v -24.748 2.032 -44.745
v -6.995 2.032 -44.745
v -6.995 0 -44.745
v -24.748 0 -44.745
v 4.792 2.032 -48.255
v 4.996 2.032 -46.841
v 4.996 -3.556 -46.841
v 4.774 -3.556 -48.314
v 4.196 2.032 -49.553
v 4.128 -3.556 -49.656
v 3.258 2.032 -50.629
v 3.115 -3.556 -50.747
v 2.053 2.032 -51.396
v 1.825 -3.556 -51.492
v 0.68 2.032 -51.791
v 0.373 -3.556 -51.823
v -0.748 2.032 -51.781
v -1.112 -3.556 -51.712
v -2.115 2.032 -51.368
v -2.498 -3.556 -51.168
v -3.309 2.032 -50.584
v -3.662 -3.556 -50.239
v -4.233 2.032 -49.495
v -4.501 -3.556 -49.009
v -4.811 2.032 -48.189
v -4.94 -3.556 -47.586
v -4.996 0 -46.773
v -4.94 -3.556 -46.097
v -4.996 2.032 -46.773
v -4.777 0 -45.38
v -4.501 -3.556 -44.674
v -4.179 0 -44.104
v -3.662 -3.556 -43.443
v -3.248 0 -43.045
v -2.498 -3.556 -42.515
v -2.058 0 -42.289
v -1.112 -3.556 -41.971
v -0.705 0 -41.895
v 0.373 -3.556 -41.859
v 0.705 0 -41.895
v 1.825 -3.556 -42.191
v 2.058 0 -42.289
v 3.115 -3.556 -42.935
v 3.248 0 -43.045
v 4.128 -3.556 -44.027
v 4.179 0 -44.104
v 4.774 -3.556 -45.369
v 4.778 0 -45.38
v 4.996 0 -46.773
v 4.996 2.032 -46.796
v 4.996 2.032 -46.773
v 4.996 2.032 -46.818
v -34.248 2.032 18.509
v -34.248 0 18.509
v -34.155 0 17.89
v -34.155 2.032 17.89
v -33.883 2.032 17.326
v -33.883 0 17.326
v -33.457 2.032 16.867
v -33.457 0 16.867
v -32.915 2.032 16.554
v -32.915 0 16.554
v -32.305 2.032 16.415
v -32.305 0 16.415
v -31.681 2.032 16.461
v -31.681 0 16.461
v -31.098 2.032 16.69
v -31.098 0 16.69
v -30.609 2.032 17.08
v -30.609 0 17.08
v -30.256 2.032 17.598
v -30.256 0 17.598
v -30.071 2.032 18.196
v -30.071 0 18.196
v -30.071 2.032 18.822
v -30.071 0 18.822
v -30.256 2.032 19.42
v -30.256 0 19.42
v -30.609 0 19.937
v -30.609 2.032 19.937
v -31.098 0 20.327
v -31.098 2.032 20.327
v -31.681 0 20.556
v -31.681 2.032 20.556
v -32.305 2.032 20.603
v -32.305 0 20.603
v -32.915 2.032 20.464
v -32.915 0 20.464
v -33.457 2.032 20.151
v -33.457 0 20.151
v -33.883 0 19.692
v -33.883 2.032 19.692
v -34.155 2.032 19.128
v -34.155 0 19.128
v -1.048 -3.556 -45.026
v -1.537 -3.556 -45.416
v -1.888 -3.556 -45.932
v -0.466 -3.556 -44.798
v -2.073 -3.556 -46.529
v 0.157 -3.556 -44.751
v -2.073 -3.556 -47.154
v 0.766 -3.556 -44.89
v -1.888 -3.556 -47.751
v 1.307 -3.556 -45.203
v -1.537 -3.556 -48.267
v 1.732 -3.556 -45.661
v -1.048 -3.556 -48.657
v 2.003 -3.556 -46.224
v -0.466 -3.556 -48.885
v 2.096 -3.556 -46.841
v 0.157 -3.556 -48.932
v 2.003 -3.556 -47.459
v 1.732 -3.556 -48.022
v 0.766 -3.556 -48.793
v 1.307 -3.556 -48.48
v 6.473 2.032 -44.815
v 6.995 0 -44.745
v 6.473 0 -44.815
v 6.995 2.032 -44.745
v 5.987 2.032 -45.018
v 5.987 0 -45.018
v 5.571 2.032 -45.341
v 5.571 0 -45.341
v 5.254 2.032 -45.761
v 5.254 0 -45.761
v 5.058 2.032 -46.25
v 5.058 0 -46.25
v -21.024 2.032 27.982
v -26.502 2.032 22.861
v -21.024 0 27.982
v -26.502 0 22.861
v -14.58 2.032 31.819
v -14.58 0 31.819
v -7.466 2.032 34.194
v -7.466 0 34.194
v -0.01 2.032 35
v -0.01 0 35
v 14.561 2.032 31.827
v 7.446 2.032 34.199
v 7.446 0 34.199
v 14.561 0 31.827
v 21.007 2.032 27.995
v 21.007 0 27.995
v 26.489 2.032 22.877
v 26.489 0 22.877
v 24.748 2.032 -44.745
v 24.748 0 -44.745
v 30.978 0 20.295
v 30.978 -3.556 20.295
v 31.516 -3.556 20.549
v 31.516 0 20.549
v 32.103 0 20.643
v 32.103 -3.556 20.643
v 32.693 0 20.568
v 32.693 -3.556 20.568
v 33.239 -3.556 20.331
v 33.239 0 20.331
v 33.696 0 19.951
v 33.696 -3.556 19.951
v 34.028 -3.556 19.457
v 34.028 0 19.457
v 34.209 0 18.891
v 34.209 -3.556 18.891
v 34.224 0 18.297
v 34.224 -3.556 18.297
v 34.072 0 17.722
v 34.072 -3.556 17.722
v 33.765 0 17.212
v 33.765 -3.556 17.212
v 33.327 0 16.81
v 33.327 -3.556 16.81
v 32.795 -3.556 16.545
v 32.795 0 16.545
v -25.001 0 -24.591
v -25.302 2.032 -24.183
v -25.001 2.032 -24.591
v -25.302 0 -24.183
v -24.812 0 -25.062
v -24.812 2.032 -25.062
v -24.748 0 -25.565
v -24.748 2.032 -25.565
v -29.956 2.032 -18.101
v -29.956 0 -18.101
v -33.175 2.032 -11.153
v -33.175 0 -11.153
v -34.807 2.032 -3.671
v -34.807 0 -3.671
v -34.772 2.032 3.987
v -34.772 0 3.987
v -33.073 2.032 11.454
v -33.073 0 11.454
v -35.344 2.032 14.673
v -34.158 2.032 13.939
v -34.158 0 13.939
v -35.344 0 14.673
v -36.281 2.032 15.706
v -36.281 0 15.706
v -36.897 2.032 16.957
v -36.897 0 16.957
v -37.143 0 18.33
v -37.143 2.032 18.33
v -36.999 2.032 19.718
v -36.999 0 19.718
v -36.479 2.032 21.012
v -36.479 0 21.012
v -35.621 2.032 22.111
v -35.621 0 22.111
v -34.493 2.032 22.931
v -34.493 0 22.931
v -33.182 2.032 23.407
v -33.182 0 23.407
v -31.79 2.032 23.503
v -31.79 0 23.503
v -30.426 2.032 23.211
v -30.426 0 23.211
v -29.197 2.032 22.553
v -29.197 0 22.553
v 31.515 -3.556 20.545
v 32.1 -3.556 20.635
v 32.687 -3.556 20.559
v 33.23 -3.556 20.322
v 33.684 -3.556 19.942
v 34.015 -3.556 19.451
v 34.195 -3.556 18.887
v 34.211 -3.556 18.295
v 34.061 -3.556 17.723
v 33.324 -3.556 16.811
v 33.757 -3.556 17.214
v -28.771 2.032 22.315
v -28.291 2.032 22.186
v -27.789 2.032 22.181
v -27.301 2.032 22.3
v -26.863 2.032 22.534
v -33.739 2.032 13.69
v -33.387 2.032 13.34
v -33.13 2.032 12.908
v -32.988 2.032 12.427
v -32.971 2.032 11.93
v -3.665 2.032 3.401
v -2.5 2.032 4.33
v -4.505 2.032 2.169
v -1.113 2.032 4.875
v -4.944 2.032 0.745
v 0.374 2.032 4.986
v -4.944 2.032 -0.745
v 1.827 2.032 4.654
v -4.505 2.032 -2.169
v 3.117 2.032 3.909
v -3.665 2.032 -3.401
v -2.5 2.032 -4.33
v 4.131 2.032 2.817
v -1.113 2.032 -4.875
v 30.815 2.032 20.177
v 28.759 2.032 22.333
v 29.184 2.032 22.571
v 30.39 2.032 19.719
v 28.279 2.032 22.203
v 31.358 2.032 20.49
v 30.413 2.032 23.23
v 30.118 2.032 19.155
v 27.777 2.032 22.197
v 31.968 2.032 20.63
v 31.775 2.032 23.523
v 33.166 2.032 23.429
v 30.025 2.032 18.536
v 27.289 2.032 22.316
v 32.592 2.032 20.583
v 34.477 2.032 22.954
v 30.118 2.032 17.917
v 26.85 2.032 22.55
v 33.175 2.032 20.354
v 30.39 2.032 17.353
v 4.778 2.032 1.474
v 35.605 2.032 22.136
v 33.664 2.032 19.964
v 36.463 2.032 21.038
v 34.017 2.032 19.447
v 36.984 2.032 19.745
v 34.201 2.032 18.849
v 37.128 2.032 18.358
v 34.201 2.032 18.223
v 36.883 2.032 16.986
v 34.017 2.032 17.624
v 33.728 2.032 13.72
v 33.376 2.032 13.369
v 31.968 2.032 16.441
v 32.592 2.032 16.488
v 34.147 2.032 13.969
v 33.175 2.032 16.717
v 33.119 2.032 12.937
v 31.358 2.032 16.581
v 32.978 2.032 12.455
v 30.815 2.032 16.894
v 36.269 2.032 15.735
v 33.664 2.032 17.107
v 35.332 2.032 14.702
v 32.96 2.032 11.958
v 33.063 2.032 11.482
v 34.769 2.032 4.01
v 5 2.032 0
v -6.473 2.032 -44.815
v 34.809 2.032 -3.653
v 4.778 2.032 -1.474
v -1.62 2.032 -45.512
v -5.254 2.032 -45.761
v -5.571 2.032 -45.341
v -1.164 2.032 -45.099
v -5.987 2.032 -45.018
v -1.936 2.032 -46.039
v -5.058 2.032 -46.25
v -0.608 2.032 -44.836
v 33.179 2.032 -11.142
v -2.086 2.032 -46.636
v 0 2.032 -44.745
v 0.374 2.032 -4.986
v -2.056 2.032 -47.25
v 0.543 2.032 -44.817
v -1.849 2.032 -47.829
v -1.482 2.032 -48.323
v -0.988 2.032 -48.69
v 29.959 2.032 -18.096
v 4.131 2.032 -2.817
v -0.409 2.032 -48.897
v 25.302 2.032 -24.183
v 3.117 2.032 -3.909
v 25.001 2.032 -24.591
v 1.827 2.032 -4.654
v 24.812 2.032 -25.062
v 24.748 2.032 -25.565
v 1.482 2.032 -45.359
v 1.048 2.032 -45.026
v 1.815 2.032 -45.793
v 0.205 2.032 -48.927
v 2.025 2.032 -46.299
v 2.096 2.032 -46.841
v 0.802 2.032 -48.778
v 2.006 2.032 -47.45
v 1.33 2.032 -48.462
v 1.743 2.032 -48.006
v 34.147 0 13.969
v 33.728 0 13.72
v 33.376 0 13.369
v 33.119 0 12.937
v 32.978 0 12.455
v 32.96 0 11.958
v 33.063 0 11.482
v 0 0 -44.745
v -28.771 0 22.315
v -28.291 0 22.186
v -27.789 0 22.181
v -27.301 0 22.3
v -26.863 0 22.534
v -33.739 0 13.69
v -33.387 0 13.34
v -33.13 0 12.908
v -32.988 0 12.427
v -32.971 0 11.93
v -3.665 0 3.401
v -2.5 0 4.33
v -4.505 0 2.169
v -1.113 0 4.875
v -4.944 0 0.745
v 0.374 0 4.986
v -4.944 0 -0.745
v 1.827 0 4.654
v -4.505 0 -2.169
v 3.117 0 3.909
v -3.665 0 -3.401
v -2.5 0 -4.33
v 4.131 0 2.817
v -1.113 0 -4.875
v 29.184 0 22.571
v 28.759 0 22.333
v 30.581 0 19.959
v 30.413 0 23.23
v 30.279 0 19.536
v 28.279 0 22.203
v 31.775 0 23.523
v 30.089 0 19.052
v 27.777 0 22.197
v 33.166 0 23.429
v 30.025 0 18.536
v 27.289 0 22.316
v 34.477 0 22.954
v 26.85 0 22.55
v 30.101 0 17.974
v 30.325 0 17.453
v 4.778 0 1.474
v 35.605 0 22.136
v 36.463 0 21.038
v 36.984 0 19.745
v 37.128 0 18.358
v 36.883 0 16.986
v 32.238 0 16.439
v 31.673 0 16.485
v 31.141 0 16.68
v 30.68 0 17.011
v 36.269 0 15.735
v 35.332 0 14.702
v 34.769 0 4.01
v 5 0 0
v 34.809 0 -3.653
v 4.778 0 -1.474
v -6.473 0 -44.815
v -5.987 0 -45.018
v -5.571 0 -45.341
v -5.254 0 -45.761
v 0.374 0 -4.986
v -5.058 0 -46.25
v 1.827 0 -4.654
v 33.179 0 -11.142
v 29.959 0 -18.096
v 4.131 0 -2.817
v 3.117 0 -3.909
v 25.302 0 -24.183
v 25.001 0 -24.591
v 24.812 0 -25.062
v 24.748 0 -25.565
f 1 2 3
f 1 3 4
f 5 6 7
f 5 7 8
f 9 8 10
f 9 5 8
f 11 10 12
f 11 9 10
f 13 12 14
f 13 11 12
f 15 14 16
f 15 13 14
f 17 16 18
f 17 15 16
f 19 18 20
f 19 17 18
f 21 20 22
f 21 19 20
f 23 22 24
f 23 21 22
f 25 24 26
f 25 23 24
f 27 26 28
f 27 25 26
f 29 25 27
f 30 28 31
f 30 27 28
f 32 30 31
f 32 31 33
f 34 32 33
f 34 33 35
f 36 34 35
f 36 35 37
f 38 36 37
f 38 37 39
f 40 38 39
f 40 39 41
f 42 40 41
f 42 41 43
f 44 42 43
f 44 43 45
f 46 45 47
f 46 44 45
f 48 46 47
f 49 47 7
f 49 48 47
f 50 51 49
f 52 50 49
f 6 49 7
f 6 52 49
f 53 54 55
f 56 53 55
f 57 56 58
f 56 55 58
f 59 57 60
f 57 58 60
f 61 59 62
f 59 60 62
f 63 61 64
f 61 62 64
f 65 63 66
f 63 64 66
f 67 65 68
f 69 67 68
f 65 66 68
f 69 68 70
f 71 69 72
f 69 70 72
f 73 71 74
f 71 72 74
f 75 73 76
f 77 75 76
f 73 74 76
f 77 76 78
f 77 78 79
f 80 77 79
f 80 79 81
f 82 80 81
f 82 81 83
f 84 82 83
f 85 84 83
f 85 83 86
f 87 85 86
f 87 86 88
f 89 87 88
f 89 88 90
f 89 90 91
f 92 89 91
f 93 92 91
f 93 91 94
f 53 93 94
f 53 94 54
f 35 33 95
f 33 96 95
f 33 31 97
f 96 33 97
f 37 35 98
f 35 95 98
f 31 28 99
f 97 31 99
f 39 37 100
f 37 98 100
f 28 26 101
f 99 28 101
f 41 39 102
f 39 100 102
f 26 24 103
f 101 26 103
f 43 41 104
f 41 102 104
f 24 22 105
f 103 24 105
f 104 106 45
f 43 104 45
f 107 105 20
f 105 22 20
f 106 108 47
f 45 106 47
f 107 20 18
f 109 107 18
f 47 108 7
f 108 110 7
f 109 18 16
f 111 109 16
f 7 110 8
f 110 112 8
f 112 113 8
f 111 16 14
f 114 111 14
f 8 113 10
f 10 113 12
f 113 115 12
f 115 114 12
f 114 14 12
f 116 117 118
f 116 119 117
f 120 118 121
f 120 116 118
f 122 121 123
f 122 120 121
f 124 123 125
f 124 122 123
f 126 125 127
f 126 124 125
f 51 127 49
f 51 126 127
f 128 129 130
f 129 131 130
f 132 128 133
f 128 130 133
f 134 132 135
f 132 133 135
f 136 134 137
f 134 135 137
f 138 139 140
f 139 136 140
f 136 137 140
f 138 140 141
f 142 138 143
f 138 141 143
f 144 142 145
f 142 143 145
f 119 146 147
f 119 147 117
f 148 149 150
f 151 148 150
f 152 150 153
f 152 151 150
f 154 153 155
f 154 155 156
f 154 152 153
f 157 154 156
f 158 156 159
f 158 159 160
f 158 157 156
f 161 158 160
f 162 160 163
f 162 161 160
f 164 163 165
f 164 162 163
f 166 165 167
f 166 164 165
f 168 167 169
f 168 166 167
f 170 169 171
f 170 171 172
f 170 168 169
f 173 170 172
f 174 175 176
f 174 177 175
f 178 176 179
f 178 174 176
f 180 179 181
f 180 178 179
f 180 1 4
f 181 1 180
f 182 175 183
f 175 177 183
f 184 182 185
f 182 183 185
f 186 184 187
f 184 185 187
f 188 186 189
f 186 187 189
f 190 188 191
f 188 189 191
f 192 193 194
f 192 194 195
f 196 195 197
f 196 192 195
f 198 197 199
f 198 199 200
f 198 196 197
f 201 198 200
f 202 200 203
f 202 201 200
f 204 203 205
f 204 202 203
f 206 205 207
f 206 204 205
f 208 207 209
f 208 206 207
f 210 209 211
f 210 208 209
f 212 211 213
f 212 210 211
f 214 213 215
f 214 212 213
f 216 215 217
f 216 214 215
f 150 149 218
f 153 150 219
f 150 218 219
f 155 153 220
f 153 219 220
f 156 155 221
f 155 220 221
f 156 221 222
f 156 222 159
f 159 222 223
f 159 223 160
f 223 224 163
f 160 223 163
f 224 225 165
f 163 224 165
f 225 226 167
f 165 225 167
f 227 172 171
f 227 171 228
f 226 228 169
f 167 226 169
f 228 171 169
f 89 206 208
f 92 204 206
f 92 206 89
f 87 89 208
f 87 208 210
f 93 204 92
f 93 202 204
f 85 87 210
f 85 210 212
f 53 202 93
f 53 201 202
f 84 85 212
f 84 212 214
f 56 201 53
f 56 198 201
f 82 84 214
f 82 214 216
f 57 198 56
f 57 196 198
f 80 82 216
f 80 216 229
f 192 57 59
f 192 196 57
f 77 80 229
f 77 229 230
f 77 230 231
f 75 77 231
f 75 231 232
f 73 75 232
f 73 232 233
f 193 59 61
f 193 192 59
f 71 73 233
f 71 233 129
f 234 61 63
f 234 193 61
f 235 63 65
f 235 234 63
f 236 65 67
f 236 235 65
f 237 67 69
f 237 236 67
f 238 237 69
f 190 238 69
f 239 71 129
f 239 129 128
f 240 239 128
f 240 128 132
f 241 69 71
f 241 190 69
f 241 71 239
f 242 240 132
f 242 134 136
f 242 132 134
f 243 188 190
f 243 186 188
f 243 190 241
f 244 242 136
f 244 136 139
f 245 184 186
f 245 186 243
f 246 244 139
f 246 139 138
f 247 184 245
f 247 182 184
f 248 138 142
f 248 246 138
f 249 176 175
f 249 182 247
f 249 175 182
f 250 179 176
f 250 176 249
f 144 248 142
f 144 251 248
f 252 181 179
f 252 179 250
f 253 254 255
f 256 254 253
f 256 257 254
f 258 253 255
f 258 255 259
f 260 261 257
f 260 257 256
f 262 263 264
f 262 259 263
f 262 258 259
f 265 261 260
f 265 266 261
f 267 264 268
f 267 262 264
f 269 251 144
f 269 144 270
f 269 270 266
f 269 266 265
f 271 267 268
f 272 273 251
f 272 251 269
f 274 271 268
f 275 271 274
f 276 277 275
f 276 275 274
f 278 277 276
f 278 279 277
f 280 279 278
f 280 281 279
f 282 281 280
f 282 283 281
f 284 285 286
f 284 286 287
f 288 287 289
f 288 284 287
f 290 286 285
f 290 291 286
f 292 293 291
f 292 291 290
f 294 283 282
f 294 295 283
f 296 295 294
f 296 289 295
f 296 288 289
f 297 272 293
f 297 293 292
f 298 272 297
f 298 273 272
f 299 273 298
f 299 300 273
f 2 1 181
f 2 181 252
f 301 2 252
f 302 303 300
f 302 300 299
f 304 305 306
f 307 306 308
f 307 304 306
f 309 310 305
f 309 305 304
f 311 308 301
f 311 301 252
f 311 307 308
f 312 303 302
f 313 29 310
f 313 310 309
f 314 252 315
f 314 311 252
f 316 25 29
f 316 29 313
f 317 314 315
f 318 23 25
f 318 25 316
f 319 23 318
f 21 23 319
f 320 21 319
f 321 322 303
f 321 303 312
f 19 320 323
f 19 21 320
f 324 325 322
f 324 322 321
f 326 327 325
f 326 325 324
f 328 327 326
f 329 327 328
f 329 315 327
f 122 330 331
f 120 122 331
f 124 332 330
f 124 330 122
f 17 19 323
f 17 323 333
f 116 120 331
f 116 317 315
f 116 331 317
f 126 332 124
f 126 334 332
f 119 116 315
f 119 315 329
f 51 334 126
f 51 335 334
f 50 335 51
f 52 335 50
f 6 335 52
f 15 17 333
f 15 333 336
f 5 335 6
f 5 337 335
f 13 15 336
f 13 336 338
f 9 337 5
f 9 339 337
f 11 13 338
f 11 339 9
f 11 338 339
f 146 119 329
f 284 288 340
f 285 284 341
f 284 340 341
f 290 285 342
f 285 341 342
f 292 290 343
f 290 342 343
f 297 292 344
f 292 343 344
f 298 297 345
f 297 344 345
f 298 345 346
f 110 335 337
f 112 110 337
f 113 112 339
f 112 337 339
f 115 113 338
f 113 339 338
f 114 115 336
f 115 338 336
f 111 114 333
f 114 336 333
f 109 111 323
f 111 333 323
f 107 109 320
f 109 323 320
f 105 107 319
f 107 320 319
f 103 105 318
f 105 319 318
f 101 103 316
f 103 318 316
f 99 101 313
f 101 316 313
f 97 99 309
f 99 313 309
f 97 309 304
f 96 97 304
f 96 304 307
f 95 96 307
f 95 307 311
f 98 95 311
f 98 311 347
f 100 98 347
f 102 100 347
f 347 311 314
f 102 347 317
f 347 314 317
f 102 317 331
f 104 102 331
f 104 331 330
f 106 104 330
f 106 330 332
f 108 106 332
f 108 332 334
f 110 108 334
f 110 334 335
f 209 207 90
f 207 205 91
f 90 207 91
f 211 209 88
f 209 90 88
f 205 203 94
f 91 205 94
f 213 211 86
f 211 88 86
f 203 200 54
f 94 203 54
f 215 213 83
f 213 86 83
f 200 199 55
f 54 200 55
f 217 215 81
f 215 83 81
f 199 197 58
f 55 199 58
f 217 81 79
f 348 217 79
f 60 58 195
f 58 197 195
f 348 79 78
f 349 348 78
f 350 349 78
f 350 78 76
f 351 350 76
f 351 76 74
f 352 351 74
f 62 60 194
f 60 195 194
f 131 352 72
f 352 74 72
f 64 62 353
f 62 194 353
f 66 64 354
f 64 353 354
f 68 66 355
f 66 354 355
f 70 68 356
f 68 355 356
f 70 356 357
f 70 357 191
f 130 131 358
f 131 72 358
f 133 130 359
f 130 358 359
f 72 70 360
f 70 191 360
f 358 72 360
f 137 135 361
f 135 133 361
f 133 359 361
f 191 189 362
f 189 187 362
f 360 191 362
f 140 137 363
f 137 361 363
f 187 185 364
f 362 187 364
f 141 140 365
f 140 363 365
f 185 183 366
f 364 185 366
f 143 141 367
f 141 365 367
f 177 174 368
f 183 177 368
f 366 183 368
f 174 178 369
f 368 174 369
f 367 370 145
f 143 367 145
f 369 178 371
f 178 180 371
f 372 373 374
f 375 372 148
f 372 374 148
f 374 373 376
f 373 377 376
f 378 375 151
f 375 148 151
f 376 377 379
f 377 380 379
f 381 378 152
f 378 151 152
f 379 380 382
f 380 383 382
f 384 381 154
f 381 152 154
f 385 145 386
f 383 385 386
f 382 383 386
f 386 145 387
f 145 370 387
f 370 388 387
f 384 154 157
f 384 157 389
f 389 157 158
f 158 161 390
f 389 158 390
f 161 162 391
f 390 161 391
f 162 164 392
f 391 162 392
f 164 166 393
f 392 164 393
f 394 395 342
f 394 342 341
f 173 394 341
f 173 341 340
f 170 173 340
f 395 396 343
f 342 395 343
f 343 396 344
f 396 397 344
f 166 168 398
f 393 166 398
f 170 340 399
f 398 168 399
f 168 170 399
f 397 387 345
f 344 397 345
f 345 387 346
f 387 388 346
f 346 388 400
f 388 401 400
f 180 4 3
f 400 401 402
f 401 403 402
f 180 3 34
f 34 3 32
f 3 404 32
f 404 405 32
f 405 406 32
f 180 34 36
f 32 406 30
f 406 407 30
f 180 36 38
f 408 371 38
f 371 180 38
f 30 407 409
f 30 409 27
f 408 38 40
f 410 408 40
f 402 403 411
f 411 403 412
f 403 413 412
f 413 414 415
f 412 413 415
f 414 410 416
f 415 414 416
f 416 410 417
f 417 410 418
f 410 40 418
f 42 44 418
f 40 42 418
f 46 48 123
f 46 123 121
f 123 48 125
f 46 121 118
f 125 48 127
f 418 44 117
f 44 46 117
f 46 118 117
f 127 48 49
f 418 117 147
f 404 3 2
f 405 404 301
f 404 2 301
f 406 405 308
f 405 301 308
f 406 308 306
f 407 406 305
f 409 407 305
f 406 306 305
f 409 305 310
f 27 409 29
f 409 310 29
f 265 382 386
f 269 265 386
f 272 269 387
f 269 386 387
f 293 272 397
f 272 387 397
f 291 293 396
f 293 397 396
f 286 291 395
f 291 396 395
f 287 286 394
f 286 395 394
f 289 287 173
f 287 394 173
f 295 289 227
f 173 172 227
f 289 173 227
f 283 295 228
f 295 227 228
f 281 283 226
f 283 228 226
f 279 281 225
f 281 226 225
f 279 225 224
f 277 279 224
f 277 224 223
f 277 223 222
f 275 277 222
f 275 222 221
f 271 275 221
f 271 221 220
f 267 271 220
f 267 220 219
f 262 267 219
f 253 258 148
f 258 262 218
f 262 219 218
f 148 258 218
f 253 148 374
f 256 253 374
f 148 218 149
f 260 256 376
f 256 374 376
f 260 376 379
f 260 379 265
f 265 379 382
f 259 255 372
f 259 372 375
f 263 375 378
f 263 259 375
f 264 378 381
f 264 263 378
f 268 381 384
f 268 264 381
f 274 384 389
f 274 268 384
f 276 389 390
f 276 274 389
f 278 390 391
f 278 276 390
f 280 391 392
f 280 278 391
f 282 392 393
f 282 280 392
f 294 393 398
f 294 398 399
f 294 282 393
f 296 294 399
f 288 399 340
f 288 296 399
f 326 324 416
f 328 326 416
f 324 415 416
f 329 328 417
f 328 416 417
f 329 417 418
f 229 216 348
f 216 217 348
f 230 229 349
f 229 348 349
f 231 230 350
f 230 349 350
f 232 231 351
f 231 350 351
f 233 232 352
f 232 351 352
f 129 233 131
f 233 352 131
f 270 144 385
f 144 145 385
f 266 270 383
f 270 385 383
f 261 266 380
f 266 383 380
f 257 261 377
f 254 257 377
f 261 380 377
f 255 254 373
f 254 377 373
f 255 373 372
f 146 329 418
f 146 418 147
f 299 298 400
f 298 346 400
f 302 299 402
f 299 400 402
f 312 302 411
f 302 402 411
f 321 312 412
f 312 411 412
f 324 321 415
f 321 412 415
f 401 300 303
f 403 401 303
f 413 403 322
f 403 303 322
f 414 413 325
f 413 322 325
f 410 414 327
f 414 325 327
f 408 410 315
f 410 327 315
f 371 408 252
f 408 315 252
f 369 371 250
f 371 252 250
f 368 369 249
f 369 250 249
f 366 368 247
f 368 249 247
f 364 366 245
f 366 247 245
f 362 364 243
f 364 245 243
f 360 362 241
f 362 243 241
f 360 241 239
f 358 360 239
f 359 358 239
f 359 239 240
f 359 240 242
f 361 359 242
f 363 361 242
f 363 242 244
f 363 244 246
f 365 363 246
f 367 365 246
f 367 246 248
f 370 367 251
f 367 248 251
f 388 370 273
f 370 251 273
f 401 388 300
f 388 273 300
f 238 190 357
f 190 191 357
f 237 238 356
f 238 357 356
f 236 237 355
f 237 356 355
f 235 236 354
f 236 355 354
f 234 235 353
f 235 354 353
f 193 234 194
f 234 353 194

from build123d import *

# Parameters (mm, degrees)
SKETCH13_R                 = 35
BOSS_EXTRUDE3_DEPTH        = 2.032
BOSS_EXTRUDE4_DEPTH        = 2.032
SKETCH15_R                 = 4.995989681
SKETCH15_R_2               = 2.096052025
BOSS_EXTRUDE11_DEPTH       = 5.588
SKETCH14_6_R               = 4.995125596
BOSS_EXTRUDE12_DEPTH       = 2.032
SKETCH14_8_R               = 2.101679538
BOSS_EXTRUDE14_DEPTH       = 5.588
F_4_2_4_2_DIAMETER_HOLE1_D = 4.2
SKETCH14_11_R              = 4.999542267
BOSS_EXTRUDE15_DEPTH       = 2.032
F_4_2_4_2_DIAMETER_HOLE2_D = 4.2
FILLET4_R                  = 2
FILLET6_R                  = 2
FILLET7_R                  = 2
FILLET8_R                  = 2
FILLET9_R                  = 2
FILLET10_R                 = 2
FILLET11_R                 = 2
FILLET12_R                 = 2
SKETCH28_R                 = 5
CUT_EXTRUDE1_DEPTH         = 2.032


with BuildPart() as part:
    # Sketch13 → Boss-Extrude3 (new body)
    with BuildSketch(Plane(origin=(0, 0, 0), x_dir=(1, 0, 0), z_dir=(0, 1, 0))):
        Circle(SKETCH13_R)
    extrude(amount=BOSS_EXTRUDE3_DEPTH)

    # Sketch14 → Boss-Extrude4 (add)
    with BuildSketch(Plane(origin=(0, 2.032, 0), x_dir=(1, 0, 0), z_dir=(0, 1, 0))):
        Polygon((-24.747800113, 24.749674535), (24.747650593, 24.749824043), (24.747590193, 44.74538209), (-24.747860512, 44.745232583), align=None)
    extrude(amount=-BOSS_EXTRUDE4_DEPTH)

    # Sketch15 → Boss-Extrude11 (add)
    with BuildSketch(Plane(origin=(0, 2.032, 0), x_dir=(1, 0, 0), z_dir=(0, 1, 0))):
        with Locations((0, 46.841359357)):
            Circle(SKETCH15_R)
        with Locations((0, 46.841359357)):
            Circle(SKETCH15_R_2, mode=Mode.SUBTRACT)
    extrude(amount=-BOSS_EXTRUDE11_DEPTH)

    # Sketch14<6> → Boss-Extrude12 (add)
    with BuildSketch(Plane(origin=(0, 2.032, 0), x_dir=(1, 0, 0), z_dir=(0, 1, 0))):
        with Locations((32.136488635, -18.541287958)):
            Circle(SKETCH14_6_R)
    extrude(amount=-BOSS_EXTRUDE12_DEPTH)

    # Sketch14<8> → Boss-Extrude14 (add, through all)
    with BuildSketch(Plane(origin=(0, 2.032, 0), x_dir=(1, 0, 0), z_dir=(0, 1, 0))):
        with Locations((32.136488635, -18.541287958)):
            Circle(SKETCH14_8_R)
    extrude(amount=-BOSS_EXTRUDE14_DEPTH)

    # Ø4.2 (4.2) Diameter Hole1 (through all)
    with Locations(Plane(origin=(0, 2.032, 0), x_dir=(1, 0, 0), z_dir=(0, 1, 0))):
        with Locations((32.124781199, -18.535617326)):
            Hole(F_4_2_4_2_DIAMETER_HOLE1_D / 2)

    # Sketch14<11> → Boss-Extrude15 (add)
    with BuildSketch(Plane(origin=(0, 2.032, 0), x_dir=(1, 0, 0), z_dir=(0, 1, 0))):
        with Locations((-32.146455556, -18.516181944)):
            Circle(SKETCH14_11_R)
    extrude(amount=-BOSS_EXTRUDE15_DEPTH)

    # Ø4.2 (4.2) Diameter Hole2 (through all)
    with Locations(Plane(origin=(0, 2.032, 0), x_dir=(1, 0, 0), z_dir=(0, 1, 0))):
        with Locations((-32.148016614, -18.508796165)):
            Hole(F_4_2_4_2_DIAMETER_HOLE2_D / 2)

    # Fillet4
    fillet4_edges = [part.edges().sort_by_distance(p)[0] for p in [
        (-24.747800113, 1.016, -24.749674535),
    ]]
    fillet(fillet4_edges, radius=FILLET4_R)

    # Fillet6
    fillet6_edges = [part.edges().sort_by_distance(p)[0] for p in [
        (-32.283887234, 1.016, 13.518528953),
    ]]
    fillet(fillet6_edges, radius=FILLET6_R)

    # Fillet7
    fillet7_edges = [part.edges().sort_by_distance(p)[0] for p in [
        (-27.892412635, 1.016, 21.142689456),
    ]]
    fillet(fillet7_edges, radius=FILLET7_R)

    # Fillet8
    fillet8_edges = [part.edges().sort_by_distance(p)[0] for p in [
        (27.881240805, 1.016, 21.157419766),
    ]]
    fillet(fillet8_edges, radius=FILLET8_R)

    # Fillet9
    fillet9_edges = [part.edges().sort_by_distance(p)[0] for p in [
        (32.27153567, 1.016, 13.547988245),
    ]]
    fillet(fillet9_edges, radius=FILLET9_R)

    # Fillet10
    fillet10_edges = [part.edges().sort_by_distance(p)[0] for p in [
        (24.747650593, 1.016, -24.749824043),
    ]]
    fillet(fillet10_edges, radius=FILLET10_R)

    # Fillet11
    fillet11_edges = [part.edges().sort_by_distance(p)[0] for p in [
        (4.535034317, 1.016, -44.745321036),
    ]]
    fillet(fillet11_edges, radius=FILLET11_R)

    # Fillet12
    fillet12_edges = [part.edges().sort_by_distance(p)[0] for p in [
        (-4.535021654, 1.016, -44.745293638),
    ]]
    fillet(fillet12_edges, radius=FILLET12_R)

    # Sketch28 → Cut-Extrude1 (cut)
    with BuildSketch(Plane(origin=(0, 2.032, 0), x_dir=(1, 0, 0), z_dir=(0, 1, 0))):
        Circle(SKETCH28_R)
    extrude(amount=-CUT_EXTRUDE1_DEPTH, mode=Mode.SUBTRACT)


solid = part.part
